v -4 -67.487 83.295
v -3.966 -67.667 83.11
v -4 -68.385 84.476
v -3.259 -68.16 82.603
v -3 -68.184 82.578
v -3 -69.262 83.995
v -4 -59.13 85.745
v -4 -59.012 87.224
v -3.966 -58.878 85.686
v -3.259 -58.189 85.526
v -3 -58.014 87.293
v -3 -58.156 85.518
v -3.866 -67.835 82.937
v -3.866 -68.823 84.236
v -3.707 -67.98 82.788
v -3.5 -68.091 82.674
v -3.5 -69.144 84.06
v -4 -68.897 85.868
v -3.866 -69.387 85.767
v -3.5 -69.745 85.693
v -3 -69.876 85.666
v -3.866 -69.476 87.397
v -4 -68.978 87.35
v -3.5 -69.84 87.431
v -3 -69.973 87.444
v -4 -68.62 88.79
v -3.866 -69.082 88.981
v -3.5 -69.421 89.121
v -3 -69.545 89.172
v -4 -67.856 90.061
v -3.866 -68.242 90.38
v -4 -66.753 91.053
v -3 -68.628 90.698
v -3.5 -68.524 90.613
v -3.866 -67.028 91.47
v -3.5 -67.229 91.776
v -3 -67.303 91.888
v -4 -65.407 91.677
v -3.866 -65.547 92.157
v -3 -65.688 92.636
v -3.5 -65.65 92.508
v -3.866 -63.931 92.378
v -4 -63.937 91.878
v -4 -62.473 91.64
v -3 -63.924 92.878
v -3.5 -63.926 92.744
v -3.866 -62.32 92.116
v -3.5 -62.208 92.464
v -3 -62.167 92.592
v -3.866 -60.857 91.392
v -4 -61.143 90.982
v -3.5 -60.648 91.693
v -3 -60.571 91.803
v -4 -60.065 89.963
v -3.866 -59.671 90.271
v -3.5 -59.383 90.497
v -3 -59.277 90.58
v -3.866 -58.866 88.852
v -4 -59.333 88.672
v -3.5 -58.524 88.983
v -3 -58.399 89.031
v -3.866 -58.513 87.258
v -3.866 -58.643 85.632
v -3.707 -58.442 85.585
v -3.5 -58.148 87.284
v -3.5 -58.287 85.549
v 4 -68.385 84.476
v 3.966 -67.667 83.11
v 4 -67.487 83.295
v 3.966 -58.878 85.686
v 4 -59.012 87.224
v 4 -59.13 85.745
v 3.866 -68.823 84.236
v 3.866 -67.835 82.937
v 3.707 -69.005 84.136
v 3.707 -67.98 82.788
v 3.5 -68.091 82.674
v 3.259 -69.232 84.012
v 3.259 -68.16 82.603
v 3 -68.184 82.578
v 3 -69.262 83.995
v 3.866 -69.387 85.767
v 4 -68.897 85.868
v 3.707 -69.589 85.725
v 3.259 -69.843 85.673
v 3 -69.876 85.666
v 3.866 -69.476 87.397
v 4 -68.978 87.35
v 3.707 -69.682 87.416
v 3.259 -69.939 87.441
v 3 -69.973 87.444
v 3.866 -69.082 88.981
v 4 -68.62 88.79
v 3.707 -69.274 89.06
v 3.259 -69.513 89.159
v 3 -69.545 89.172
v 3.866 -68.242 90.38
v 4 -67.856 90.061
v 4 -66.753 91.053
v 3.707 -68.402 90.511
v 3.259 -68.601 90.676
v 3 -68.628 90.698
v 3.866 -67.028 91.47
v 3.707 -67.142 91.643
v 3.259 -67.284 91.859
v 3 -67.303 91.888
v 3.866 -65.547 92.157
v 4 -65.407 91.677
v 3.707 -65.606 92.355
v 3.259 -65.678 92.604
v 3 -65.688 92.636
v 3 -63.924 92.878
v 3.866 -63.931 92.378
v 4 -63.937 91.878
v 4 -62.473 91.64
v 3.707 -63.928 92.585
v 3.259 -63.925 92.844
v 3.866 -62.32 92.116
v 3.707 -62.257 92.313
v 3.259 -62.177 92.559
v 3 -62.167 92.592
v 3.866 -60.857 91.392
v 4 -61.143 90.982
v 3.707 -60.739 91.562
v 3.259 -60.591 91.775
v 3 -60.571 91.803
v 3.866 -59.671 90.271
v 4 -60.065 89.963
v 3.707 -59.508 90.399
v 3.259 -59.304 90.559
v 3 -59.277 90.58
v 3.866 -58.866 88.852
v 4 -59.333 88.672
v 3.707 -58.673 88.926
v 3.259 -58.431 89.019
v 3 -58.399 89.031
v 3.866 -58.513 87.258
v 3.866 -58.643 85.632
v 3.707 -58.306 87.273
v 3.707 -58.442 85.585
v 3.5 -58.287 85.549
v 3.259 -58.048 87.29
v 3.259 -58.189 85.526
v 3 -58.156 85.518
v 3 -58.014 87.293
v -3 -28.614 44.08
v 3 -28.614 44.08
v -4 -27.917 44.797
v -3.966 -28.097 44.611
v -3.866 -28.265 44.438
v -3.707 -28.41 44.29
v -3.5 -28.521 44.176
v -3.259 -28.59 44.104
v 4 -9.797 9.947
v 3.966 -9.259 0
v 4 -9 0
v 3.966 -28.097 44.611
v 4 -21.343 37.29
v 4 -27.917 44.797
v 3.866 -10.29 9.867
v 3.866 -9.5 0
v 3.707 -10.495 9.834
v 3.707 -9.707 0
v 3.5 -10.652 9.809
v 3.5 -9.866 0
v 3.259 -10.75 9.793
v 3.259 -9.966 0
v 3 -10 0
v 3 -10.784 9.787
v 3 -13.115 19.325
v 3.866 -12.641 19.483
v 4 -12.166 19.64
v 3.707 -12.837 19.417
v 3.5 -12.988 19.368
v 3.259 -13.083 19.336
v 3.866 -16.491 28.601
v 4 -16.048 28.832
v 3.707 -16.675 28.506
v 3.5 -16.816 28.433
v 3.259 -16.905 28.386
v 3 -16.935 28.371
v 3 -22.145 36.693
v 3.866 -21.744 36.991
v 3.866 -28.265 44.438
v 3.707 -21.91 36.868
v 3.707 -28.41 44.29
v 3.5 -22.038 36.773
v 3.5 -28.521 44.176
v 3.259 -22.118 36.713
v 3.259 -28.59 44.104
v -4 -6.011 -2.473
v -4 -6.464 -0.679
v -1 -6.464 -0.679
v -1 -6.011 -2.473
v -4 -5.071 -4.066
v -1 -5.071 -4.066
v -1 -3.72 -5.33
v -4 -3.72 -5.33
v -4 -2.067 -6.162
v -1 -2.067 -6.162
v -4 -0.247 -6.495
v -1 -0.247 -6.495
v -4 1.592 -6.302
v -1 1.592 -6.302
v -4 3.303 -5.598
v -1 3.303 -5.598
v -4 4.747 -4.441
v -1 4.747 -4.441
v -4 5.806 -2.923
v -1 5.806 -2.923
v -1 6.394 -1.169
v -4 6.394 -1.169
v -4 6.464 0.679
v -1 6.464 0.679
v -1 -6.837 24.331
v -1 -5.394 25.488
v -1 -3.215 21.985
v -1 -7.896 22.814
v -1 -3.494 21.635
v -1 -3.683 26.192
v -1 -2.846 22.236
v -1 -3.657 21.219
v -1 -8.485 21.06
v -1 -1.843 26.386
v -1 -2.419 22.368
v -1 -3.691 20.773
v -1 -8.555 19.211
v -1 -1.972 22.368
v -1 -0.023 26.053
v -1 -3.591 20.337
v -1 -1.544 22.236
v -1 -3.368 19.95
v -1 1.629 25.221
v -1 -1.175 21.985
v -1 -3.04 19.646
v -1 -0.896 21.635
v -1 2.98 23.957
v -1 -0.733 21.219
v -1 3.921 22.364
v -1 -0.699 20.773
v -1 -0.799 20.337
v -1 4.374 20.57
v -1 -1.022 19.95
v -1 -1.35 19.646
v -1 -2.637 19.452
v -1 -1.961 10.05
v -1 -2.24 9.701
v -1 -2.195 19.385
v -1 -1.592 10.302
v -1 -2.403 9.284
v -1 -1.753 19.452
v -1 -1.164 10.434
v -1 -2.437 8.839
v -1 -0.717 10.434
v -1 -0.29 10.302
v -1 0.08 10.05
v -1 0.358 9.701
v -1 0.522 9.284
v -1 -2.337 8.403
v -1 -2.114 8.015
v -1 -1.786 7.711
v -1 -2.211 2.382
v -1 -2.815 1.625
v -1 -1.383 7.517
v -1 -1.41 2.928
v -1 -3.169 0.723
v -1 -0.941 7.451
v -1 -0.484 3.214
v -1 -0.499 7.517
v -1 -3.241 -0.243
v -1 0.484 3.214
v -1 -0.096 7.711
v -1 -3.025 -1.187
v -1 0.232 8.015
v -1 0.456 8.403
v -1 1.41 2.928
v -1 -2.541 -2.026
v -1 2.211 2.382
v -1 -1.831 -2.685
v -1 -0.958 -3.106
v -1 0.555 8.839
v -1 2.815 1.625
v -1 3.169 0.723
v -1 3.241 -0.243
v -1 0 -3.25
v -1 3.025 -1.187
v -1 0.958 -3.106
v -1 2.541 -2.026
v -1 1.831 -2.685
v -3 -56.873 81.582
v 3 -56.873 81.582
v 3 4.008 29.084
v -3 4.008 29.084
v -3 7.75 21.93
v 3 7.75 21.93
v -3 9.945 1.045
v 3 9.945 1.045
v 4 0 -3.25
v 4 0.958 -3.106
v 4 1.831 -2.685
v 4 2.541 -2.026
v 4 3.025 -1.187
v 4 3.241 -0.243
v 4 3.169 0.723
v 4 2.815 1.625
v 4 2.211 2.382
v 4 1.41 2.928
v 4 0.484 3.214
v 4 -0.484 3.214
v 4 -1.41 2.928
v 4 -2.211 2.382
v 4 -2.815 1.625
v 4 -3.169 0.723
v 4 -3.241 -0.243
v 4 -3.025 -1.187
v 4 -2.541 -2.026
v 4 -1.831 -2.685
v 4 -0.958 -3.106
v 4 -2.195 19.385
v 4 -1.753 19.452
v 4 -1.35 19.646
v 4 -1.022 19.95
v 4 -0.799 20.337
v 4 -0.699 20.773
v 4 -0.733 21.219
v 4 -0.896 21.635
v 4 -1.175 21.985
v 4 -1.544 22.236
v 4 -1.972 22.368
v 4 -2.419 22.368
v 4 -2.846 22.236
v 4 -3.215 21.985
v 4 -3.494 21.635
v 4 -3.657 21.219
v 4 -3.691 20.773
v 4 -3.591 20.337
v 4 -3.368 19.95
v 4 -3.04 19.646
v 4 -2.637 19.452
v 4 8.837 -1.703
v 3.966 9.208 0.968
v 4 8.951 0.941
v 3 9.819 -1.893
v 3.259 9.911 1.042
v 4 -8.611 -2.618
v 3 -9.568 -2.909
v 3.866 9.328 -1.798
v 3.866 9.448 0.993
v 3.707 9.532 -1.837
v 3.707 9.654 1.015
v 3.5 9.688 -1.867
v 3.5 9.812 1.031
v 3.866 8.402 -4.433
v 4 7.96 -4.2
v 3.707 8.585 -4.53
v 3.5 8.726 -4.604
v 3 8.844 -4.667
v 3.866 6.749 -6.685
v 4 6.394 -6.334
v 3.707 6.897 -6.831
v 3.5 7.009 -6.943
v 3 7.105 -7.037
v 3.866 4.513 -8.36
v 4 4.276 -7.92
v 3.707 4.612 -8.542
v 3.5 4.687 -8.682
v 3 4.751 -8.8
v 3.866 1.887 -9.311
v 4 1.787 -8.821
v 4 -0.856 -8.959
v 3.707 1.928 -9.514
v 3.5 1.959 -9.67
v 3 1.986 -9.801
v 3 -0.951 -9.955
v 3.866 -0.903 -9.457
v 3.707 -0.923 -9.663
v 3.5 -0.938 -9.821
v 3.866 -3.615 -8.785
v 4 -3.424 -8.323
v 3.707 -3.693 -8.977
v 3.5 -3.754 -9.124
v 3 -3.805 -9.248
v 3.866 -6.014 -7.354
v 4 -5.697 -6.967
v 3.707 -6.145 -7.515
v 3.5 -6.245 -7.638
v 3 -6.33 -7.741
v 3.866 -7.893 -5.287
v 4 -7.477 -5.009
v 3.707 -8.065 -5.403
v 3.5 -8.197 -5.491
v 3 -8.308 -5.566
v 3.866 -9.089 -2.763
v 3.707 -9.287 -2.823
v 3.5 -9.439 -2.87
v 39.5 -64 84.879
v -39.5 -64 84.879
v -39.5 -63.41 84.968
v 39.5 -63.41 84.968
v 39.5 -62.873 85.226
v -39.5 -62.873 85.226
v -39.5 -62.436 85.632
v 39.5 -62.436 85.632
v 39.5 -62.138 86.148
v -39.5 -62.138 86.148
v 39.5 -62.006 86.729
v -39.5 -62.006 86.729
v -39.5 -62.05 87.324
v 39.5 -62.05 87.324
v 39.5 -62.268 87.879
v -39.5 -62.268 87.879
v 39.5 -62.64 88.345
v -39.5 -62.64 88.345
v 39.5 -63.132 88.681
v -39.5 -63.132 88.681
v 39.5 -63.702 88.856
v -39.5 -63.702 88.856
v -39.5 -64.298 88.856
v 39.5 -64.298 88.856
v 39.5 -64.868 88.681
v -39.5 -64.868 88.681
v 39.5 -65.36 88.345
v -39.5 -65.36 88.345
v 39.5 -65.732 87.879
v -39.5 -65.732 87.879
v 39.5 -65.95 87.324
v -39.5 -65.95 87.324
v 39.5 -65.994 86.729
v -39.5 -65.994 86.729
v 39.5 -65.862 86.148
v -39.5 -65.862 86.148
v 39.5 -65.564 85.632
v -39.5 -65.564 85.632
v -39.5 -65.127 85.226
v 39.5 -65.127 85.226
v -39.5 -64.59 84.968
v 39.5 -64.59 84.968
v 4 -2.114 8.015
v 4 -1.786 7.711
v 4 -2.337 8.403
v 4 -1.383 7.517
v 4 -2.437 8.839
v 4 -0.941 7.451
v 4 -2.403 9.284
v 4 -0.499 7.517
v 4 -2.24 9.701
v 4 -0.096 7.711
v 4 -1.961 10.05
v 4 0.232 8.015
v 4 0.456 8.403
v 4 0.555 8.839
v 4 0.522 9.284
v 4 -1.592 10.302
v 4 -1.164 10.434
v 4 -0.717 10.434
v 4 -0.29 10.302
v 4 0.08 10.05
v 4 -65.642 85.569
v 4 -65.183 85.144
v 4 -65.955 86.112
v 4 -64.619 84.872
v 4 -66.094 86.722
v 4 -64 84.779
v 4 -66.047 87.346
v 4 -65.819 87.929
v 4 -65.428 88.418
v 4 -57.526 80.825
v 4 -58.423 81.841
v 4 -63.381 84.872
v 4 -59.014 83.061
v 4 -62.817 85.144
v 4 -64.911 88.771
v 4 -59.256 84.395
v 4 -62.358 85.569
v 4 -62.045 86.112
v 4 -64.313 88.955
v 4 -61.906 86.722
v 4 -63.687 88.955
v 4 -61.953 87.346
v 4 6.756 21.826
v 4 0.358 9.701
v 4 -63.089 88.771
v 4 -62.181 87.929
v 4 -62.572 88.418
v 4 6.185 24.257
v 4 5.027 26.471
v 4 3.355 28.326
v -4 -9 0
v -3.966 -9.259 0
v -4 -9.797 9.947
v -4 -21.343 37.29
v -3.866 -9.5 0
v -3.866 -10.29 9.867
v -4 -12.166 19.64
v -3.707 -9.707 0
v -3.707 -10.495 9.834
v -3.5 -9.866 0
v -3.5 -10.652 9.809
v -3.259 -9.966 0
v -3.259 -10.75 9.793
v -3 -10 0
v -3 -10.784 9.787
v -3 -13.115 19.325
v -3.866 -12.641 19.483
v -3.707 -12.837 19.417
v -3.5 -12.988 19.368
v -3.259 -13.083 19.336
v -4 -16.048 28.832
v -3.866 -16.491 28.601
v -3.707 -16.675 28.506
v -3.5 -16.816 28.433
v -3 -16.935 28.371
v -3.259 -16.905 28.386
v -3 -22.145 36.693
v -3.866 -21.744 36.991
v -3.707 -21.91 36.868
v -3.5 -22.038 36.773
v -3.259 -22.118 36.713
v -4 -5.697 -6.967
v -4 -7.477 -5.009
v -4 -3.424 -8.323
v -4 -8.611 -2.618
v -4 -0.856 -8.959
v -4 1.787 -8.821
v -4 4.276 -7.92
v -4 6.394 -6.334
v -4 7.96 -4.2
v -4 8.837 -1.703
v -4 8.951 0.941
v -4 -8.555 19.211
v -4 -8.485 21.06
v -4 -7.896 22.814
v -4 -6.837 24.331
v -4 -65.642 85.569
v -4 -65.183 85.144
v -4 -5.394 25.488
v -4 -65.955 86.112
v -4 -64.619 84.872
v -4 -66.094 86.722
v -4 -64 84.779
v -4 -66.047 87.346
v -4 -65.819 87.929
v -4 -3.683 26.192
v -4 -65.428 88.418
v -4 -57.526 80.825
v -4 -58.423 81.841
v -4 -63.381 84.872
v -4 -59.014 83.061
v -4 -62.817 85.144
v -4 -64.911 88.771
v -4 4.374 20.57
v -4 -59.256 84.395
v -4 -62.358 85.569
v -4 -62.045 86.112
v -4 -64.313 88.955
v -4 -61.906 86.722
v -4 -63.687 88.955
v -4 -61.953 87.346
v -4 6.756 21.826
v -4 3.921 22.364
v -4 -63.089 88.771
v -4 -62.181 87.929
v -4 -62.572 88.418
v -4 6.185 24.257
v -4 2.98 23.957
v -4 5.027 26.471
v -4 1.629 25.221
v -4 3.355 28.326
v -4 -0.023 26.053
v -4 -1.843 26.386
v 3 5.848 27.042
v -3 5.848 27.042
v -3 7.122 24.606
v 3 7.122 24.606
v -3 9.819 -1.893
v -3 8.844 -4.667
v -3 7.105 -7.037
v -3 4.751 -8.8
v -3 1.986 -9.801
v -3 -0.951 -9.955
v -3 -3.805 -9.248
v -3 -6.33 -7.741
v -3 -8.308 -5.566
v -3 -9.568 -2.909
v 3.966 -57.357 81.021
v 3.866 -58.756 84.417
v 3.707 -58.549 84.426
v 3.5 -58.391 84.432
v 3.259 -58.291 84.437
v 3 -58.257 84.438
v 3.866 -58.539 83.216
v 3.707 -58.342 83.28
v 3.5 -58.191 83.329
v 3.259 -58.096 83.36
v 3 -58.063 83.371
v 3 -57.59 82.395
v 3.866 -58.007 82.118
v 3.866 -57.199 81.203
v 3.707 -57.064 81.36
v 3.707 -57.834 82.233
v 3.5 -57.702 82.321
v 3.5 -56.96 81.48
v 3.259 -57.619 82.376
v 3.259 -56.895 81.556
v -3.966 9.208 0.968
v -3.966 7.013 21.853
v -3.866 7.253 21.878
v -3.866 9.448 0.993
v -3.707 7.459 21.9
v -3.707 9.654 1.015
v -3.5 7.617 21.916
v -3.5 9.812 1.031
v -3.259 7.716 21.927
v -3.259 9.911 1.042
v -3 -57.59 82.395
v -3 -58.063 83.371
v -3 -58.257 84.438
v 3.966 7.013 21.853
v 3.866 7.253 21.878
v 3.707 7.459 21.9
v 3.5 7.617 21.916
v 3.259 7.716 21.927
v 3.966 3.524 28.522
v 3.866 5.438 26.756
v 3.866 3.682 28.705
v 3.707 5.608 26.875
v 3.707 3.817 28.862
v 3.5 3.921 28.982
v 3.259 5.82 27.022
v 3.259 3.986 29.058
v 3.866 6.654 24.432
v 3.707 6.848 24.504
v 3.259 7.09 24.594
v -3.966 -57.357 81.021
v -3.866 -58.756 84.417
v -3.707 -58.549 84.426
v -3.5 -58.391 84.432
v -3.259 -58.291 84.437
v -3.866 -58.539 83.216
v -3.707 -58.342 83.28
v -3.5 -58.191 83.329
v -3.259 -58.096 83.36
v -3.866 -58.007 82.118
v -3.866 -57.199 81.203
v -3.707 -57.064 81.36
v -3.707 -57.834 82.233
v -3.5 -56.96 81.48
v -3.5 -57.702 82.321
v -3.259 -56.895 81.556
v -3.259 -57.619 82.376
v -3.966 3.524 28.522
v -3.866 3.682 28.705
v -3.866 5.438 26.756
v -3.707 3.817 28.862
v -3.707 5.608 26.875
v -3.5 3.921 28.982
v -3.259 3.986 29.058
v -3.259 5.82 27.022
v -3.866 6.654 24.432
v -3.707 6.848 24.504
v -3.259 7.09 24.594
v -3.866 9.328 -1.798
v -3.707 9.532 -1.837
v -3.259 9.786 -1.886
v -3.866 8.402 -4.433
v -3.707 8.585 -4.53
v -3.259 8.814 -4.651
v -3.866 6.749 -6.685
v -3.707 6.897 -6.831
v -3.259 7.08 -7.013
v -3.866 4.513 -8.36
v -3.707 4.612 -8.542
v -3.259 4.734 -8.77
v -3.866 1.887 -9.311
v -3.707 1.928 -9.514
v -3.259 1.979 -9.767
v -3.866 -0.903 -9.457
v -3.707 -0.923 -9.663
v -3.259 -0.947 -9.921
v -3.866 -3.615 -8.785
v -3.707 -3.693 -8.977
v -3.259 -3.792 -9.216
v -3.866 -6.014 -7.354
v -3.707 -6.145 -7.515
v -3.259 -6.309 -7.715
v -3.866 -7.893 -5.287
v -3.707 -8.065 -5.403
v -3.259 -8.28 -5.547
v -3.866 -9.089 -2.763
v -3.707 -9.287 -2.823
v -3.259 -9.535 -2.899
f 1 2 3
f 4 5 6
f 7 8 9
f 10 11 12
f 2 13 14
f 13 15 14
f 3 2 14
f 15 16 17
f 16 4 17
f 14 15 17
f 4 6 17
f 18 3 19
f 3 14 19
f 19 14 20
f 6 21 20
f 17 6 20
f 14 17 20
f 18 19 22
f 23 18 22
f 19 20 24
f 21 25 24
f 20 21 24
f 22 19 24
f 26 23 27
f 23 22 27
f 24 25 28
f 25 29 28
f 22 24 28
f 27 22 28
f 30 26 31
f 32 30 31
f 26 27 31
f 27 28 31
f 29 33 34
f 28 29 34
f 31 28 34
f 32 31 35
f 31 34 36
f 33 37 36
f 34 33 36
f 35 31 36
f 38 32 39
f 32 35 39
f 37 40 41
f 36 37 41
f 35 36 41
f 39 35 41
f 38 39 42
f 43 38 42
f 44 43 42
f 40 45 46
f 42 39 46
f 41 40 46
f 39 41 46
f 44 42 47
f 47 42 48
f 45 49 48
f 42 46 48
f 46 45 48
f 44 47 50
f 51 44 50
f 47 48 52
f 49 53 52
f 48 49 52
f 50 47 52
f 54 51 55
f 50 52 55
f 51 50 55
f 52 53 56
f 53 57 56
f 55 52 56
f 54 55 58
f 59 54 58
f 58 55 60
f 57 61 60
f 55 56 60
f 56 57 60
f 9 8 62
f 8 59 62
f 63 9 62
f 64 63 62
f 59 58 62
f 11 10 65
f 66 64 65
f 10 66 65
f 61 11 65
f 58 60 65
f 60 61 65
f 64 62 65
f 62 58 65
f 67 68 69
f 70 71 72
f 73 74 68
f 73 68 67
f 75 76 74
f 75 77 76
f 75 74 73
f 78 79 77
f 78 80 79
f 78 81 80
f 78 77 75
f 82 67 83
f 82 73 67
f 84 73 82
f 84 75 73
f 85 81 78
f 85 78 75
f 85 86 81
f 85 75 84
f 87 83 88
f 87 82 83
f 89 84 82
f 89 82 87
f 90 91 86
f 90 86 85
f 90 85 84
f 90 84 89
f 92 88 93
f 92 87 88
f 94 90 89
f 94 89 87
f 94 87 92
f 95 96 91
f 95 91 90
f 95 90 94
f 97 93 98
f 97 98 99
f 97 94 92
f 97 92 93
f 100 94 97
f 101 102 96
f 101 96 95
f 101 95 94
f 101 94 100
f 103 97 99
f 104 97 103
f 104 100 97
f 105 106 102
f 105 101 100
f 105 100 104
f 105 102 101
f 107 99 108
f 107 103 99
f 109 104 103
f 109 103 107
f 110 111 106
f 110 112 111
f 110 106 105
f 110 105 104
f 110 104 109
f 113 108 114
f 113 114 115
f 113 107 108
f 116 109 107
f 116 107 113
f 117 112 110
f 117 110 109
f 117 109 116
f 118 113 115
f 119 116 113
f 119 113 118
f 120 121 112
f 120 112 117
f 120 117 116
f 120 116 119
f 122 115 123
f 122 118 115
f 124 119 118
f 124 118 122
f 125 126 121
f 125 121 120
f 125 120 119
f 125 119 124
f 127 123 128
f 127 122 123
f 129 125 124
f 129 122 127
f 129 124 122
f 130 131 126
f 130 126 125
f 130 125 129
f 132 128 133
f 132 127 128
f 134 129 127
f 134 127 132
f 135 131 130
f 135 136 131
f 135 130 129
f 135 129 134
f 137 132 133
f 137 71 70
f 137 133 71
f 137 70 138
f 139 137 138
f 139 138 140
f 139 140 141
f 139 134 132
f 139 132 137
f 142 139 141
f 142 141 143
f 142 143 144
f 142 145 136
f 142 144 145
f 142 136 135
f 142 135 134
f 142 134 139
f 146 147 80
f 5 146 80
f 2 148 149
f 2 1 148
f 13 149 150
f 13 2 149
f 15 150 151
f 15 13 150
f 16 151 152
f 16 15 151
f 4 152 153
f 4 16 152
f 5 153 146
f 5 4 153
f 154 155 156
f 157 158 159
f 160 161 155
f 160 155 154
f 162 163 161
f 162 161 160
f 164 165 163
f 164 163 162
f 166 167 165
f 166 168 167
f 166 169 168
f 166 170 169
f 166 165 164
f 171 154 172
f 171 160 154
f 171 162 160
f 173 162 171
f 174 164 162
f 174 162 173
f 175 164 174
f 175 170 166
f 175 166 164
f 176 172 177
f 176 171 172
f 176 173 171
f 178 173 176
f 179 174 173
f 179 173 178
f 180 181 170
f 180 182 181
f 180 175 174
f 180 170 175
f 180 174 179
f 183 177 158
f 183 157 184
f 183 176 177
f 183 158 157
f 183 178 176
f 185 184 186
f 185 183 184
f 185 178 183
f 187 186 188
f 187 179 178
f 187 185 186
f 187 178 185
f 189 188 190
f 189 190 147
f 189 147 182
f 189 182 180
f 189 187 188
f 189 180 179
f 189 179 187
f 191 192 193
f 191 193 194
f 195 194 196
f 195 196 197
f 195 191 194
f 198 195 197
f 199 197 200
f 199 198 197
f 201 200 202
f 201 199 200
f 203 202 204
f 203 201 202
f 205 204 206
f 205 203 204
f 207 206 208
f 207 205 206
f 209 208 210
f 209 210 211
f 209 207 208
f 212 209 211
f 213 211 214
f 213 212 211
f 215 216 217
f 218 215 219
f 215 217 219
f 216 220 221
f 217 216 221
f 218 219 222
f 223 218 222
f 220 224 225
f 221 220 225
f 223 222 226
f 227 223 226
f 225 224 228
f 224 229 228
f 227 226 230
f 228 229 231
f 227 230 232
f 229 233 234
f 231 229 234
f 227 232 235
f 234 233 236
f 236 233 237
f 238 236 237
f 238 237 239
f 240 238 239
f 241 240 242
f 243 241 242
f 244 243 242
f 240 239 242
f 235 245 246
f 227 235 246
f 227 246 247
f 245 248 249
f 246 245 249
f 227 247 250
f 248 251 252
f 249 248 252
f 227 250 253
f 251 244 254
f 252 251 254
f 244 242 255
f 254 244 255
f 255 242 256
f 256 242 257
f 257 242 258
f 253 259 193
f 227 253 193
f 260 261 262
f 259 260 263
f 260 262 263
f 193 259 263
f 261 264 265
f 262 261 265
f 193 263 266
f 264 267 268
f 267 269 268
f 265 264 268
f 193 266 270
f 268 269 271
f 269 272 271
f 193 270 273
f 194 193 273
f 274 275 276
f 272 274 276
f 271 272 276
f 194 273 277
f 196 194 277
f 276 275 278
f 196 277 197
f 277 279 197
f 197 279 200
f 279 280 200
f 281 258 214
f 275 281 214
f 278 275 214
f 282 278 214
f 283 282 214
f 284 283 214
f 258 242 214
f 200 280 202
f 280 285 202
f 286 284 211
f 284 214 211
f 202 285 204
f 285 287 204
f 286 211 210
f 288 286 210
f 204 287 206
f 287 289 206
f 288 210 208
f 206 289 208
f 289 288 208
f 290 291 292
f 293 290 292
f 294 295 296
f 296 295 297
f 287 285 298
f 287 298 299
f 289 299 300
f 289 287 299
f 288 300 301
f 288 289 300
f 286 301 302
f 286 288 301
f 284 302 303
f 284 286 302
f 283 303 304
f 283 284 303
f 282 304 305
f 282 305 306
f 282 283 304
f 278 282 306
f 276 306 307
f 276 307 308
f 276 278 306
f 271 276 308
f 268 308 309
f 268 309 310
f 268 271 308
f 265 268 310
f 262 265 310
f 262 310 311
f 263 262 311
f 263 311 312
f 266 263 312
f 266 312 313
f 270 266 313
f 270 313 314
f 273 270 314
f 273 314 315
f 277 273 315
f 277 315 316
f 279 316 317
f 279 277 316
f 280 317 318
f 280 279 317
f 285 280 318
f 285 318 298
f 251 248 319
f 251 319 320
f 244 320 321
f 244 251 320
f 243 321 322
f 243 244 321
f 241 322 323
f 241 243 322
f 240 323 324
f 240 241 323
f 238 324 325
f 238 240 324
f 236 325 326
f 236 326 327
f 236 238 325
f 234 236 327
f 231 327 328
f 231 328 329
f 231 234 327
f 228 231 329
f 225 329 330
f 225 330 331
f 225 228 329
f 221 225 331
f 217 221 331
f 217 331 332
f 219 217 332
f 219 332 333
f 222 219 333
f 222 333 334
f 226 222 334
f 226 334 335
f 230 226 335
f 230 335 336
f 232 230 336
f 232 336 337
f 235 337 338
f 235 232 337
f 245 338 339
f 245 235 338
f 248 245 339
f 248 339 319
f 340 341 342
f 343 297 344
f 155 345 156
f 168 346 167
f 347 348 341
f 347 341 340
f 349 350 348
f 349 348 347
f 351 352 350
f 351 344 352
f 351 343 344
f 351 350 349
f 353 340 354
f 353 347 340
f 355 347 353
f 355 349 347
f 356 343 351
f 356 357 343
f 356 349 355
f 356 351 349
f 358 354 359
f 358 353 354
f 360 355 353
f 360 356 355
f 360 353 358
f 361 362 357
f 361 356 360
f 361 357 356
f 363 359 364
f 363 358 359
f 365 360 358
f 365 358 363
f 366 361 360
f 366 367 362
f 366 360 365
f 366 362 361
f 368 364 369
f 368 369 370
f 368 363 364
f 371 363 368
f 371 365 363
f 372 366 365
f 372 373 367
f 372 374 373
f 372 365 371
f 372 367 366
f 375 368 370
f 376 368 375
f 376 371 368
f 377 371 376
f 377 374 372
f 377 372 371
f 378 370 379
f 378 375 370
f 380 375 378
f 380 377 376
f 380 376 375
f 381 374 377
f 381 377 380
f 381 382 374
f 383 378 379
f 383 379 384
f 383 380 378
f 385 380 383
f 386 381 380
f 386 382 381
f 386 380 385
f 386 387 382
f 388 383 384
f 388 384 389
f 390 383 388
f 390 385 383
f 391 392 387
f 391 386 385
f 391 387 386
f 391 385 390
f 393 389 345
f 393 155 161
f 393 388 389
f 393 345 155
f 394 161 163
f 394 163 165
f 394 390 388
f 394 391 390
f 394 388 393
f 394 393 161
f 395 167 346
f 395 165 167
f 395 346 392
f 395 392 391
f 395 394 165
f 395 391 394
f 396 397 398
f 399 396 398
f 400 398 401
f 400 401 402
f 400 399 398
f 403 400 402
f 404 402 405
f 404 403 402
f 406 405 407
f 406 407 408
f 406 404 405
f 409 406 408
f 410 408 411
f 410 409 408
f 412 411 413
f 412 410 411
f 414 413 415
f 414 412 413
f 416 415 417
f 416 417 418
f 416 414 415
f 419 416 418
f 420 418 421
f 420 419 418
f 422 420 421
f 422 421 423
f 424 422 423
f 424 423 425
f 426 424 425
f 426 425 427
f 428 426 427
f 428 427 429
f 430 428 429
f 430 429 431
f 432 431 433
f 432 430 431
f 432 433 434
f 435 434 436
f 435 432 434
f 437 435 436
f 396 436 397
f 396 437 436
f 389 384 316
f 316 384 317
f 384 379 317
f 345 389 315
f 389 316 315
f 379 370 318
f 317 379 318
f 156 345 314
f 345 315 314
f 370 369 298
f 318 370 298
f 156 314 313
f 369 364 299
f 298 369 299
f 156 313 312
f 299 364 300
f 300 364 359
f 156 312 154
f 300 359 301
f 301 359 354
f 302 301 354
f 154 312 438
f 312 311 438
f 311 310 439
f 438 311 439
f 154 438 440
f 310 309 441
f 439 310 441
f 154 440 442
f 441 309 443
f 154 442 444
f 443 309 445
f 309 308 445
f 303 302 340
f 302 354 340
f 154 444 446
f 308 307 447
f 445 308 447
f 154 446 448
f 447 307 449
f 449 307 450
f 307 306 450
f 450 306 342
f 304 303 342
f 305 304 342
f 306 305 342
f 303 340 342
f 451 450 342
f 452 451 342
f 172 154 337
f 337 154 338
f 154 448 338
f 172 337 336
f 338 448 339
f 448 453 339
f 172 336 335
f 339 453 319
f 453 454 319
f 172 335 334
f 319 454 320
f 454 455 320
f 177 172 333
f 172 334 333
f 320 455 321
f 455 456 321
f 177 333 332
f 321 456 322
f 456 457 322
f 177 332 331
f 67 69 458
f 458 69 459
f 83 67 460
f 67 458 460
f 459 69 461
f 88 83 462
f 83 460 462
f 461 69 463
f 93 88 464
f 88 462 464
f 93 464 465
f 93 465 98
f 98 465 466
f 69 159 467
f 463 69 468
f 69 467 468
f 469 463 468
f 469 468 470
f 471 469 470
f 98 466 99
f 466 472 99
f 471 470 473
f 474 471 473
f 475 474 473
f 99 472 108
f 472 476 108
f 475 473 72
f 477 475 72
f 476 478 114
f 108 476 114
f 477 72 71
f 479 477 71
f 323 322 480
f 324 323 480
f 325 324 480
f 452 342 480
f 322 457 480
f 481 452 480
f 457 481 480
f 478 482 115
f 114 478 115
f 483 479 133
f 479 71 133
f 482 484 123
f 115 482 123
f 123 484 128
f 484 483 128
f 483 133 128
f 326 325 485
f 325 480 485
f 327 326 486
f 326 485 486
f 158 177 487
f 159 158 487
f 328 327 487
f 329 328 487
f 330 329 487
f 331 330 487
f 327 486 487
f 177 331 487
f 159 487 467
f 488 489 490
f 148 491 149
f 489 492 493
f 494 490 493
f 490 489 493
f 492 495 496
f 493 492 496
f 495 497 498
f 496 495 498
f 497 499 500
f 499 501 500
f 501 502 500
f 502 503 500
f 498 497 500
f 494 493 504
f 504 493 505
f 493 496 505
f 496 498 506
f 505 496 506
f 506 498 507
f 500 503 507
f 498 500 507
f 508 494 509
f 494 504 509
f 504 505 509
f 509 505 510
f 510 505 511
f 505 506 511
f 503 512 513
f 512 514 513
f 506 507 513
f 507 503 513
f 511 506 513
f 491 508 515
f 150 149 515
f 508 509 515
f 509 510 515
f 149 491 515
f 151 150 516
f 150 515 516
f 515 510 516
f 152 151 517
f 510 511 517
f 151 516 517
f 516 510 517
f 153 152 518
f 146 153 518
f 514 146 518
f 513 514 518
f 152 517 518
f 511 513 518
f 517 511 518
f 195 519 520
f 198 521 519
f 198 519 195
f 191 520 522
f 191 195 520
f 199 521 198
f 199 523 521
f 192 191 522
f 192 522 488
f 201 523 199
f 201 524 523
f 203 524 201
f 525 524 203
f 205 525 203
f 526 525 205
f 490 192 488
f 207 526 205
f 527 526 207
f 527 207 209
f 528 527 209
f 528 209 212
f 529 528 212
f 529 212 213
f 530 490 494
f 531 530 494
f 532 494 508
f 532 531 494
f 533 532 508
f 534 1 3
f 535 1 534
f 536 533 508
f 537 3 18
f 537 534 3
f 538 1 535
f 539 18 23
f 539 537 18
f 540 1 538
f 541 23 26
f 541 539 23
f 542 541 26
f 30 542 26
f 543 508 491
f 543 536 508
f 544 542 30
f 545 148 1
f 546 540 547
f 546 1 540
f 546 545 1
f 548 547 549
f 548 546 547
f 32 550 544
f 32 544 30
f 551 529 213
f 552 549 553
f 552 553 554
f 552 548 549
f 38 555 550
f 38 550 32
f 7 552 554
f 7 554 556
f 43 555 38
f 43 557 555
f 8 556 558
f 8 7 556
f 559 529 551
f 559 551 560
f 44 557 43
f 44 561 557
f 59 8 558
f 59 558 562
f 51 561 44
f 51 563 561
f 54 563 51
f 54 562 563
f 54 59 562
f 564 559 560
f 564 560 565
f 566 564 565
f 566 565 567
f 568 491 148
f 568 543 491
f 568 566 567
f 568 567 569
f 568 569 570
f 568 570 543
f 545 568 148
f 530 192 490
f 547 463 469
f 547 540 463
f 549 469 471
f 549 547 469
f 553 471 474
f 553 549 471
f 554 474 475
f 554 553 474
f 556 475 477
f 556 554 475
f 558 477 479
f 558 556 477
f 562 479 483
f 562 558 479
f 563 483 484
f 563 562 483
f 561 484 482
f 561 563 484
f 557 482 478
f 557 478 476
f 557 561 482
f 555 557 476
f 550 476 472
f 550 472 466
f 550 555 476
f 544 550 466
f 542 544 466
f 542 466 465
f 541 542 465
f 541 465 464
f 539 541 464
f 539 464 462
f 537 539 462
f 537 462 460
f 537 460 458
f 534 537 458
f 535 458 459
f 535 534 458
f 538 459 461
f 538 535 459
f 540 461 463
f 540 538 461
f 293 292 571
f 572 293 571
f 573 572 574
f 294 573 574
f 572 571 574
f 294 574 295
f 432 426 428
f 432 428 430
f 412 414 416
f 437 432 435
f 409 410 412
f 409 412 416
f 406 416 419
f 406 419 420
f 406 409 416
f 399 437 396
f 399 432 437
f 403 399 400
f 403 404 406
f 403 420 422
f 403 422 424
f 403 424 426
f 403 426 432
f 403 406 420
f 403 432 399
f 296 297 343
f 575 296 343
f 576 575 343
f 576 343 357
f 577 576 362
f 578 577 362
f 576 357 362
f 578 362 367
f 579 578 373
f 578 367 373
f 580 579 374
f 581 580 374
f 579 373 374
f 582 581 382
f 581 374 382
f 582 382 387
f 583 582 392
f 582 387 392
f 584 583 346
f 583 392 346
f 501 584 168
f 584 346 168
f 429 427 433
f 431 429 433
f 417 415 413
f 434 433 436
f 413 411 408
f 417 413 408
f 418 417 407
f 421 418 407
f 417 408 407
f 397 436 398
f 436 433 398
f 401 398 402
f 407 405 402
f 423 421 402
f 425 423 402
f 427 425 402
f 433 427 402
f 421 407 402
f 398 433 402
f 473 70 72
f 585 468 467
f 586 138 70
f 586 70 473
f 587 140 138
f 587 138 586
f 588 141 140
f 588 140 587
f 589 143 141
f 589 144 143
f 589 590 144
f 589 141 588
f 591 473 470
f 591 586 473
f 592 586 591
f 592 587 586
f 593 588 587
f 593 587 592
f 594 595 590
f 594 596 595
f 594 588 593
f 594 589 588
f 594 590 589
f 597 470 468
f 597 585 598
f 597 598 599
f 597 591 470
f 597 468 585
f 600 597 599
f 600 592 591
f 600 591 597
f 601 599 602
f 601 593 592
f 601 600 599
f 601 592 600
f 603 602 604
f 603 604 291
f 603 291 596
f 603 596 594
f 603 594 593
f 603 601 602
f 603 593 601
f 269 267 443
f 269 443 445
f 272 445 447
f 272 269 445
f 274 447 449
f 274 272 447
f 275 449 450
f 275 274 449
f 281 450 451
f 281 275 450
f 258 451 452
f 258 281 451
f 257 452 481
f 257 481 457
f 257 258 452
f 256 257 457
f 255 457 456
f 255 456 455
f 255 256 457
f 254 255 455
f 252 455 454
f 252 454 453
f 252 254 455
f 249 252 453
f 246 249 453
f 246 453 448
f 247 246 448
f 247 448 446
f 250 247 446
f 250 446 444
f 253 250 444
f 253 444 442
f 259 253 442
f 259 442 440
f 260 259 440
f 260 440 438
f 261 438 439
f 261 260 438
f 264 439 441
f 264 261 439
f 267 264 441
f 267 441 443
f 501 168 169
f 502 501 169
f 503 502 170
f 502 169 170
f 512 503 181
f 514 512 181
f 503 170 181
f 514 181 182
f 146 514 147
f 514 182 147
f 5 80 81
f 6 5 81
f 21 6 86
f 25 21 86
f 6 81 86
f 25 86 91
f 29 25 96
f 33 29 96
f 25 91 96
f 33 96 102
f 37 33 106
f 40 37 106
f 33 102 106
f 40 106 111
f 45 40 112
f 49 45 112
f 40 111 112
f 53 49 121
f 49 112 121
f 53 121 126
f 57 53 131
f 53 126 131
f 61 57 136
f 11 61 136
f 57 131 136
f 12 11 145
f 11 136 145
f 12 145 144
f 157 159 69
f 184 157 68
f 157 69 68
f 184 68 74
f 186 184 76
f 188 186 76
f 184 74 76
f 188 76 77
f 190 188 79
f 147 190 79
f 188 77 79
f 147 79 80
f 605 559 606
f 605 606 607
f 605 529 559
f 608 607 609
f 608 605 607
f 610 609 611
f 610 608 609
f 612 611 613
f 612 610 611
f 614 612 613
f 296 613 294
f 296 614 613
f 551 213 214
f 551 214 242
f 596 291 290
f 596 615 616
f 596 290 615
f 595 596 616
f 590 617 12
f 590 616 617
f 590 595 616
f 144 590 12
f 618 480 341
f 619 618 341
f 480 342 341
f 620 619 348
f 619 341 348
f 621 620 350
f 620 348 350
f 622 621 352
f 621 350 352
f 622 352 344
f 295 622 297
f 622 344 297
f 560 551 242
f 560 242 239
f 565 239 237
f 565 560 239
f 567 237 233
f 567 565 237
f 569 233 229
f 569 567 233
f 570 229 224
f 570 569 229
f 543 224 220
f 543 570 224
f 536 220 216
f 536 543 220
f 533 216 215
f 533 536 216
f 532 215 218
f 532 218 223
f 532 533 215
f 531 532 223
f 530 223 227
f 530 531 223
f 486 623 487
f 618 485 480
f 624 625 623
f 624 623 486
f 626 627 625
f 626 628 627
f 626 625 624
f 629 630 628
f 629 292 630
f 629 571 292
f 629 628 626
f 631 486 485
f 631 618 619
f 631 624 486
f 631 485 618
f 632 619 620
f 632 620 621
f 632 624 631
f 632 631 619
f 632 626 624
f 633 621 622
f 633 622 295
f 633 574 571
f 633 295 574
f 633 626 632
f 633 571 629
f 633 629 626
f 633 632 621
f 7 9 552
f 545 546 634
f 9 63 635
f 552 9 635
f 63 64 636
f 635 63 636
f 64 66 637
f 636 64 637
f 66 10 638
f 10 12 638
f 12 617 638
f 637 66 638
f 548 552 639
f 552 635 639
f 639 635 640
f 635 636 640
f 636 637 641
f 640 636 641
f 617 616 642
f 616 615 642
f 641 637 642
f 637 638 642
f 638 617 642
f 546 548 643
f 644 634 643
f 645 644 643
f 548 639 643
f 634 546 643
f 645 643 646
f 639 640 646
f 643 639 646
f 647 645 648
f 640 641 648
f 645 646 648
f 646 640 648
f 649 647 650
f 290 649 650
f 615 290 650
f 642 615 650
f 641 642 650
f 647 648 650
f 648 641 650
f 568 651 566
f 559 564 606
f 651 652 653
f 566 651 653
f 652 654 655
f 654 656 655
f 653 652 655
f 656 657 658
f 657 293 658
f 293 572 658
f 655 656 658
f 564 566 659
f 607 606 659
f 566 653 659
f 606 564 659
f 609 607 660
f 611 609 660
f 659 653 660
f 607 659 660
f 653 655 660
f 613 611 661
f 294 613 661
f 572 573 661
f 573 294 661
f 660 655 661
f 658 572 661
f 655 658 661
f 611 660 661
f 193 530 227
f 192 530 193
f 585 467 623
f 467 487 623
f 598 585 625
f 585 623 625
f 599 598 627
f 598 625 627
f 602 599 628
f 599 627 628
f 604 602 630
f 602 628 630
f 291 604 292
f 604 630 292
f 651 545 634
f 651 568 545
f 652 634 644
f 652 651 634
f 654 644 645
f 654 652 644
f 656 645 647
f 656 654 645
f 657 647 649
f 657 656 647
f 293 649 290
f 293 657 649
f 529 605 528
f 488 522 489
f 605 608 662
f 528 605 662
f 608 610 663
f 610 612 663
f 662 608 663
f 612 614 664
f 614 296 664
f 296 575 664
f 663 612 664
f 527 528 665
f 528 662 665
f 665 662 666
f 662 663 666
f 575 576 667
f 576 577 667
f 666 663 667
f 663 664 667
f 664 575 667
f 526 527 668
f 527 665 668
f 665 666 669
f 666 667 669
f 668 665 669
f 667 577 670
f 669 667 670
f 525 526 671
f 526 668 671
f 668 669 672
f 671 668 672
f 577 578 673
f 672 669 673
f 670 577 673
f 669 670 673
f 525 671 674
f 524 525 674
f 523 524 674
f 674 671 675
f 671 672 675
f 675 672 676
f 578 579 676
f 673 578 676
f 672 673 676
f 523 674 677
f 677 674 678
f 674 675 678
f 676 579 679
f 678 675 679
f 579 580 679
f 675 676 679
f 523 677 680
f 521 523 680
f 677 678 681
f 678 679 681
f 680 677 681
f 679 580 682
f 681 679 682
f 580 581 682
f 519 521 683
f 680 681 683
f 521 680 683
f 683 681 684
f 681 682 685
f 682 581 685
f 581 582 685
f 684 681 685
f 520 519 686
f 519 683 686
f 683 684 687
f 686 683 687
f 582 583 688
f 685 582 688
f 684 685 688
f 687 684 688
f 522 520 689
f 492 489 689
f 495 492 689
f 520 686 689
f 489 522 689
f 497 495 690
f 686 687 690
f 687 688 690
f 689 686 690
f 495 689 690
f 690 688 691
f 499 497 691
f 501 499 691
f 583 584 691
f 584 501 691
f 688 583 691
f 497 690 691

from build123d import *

# Parameters (mm, degrees)
ESQUISSE3_R             = 2
BOSS_EXTRU_1_DEPTH      = 39.5
ESQUISSE5_R             = 3.25
ESQUISSE5_R_2           = 2.1
ESQUISSE5_R_3           = 1.5
BOSS_EXTRU_2_DEPTH      = 4
CONG_1_R                = 4
CONG_2_R                = 1
ENL_V_MAT_EXTRU_1_DEPTH = 3


with BuildPart() as part:
    # Esquisse3 → Boss.-Extru.1 (new, symmetric)
    with BuildSketch(Plane(origin=(0, 0, 0), x_dir=(0, 0, -1), z_dir=(1, 0, 0))):
        with Locations((-86.878738339, -64)):
            Circle(ESQUISSE3_R)
    extrude(amount=BOSS_EXTRU_1_DEPTH, both=True)


with BuildPart() as body_2:
    # Esquisse5 → Boss.-Extru.2 (new, symmetric)
    with BuildSketch(Plane(origin=(0, 0, 0), x_dir=(0, 0, -1), z_dir=(1, 0, 0))):
        with BuildLine():
            Line((-83.469999177, -59.062338881), (-29.083614474, 4.008168523))
            ThreePointArc((-29.083614474, 4.008168523), (-25.864077947, 6.561894104), (-21.930244435, 7.750121225))
            Line((-21.930244435, 7.750121225), (-1.045284633, 9.945218954))
            ThreePointArc((-1.045284633, 9.945218954), (9.986295348, 0.523359562), (0, -10))
            ThreePointArc((0, -10), (-23.924437635, -14.844274042), (-44.079882353, -28.613941988))
            Line((-44.079882353, -28.613941988), (-82.578262012, -68.18400566))
            ThreePointArc((-82.578262012, -68.18400566), (-92.850270978, -64.583779009), (-83.469999177, -59.062338881))
        make_face()
        Circle(ESQUISSE5_R, mode=Mode.SUBTRACT)
        with Locations((-86.878738339, -64)):
            Circle(ESQUISSE5_R_2, mode=Mode.SUBTRACT)
        with Locations((-8.950697058, -0.940756169)):
            Circle(ESQUISSE5_R_3, mode=Mode.SUBTRACT)
        with Locations((-20.884959803, -2.195097729)):
            Circle(ESQUISSE5_R_3, mode=Mode.SUBTRACT)
    extrude(amount=BOSS_EXTRU_2_DEPTH, both=True)

    # Congé1
    cong_1_edges = [body_2.edges().sort_by_distance(p)[0] for p in [
        (0, -59.062338881, 83.469999177),
    ]]
    fillet(cong_1_edges, radius=CONG_1_R)

    # Congé2
    cong_2_edges = [body_2.edges().sort_by_distance(p)[0] for p in [
        (4, -14.844274042, 23.924437635),
        (4, 0.523359562, -9.986295348),
        (4, 8.847670089, 11.487764534),
        (4, 6.561894104, 25.864077947),
        (4, -26.432255243, 55.33272306),
        (-4, -65.688015825, 92.636394335),
        (4, -65.688015825, 92.636394335),
        (-4, -58.063409395, 83.370995654),
        (4, -58.063409395, 83.370995654),
        (-4, -26.432255243, 55.33272306),
        (4, -48.398973824, 63.329072182),
        (-4, 6.561894104, 25.864077947),
        (-4, 8.847670089, 11.487764534),
        (-4, 0.523359562, -9.986295348),
        (-4, -14.844274042, 23.924437635),
        (-4, -48.398973824, 63.329072182),
    ]]
    fillet(cong_2_edges, radius=CONG_2_R)

    # Esquisse6 → Enlèv. mat.-Extru.1 (cut)
    with BuildSketch(Plane.ZY.offset(4)):
        with BuildLine():
            Line((0.679435011, 6.46439232), (20.569872919, 4.373823055))
            ThreePointArc((20.569872919, 4.373823055), (26.354830227, -2.770004277), (19.211002896, -8.554961585))
            Line((19.211002896, -8.554961585), (-0.679435011, -6.46439232))
            ThreePointArc((-0.679435011, -6.46439232), (-6.46439232, 0.679435011), (0.679435011, 6.46439232))
        make_face()
    extrude(amount=-ENL_V_MAT_EXTRU_1_DEPTH, mode=Mode.SUBTRACT)


solid = Compound([part.part, body_2.part])
